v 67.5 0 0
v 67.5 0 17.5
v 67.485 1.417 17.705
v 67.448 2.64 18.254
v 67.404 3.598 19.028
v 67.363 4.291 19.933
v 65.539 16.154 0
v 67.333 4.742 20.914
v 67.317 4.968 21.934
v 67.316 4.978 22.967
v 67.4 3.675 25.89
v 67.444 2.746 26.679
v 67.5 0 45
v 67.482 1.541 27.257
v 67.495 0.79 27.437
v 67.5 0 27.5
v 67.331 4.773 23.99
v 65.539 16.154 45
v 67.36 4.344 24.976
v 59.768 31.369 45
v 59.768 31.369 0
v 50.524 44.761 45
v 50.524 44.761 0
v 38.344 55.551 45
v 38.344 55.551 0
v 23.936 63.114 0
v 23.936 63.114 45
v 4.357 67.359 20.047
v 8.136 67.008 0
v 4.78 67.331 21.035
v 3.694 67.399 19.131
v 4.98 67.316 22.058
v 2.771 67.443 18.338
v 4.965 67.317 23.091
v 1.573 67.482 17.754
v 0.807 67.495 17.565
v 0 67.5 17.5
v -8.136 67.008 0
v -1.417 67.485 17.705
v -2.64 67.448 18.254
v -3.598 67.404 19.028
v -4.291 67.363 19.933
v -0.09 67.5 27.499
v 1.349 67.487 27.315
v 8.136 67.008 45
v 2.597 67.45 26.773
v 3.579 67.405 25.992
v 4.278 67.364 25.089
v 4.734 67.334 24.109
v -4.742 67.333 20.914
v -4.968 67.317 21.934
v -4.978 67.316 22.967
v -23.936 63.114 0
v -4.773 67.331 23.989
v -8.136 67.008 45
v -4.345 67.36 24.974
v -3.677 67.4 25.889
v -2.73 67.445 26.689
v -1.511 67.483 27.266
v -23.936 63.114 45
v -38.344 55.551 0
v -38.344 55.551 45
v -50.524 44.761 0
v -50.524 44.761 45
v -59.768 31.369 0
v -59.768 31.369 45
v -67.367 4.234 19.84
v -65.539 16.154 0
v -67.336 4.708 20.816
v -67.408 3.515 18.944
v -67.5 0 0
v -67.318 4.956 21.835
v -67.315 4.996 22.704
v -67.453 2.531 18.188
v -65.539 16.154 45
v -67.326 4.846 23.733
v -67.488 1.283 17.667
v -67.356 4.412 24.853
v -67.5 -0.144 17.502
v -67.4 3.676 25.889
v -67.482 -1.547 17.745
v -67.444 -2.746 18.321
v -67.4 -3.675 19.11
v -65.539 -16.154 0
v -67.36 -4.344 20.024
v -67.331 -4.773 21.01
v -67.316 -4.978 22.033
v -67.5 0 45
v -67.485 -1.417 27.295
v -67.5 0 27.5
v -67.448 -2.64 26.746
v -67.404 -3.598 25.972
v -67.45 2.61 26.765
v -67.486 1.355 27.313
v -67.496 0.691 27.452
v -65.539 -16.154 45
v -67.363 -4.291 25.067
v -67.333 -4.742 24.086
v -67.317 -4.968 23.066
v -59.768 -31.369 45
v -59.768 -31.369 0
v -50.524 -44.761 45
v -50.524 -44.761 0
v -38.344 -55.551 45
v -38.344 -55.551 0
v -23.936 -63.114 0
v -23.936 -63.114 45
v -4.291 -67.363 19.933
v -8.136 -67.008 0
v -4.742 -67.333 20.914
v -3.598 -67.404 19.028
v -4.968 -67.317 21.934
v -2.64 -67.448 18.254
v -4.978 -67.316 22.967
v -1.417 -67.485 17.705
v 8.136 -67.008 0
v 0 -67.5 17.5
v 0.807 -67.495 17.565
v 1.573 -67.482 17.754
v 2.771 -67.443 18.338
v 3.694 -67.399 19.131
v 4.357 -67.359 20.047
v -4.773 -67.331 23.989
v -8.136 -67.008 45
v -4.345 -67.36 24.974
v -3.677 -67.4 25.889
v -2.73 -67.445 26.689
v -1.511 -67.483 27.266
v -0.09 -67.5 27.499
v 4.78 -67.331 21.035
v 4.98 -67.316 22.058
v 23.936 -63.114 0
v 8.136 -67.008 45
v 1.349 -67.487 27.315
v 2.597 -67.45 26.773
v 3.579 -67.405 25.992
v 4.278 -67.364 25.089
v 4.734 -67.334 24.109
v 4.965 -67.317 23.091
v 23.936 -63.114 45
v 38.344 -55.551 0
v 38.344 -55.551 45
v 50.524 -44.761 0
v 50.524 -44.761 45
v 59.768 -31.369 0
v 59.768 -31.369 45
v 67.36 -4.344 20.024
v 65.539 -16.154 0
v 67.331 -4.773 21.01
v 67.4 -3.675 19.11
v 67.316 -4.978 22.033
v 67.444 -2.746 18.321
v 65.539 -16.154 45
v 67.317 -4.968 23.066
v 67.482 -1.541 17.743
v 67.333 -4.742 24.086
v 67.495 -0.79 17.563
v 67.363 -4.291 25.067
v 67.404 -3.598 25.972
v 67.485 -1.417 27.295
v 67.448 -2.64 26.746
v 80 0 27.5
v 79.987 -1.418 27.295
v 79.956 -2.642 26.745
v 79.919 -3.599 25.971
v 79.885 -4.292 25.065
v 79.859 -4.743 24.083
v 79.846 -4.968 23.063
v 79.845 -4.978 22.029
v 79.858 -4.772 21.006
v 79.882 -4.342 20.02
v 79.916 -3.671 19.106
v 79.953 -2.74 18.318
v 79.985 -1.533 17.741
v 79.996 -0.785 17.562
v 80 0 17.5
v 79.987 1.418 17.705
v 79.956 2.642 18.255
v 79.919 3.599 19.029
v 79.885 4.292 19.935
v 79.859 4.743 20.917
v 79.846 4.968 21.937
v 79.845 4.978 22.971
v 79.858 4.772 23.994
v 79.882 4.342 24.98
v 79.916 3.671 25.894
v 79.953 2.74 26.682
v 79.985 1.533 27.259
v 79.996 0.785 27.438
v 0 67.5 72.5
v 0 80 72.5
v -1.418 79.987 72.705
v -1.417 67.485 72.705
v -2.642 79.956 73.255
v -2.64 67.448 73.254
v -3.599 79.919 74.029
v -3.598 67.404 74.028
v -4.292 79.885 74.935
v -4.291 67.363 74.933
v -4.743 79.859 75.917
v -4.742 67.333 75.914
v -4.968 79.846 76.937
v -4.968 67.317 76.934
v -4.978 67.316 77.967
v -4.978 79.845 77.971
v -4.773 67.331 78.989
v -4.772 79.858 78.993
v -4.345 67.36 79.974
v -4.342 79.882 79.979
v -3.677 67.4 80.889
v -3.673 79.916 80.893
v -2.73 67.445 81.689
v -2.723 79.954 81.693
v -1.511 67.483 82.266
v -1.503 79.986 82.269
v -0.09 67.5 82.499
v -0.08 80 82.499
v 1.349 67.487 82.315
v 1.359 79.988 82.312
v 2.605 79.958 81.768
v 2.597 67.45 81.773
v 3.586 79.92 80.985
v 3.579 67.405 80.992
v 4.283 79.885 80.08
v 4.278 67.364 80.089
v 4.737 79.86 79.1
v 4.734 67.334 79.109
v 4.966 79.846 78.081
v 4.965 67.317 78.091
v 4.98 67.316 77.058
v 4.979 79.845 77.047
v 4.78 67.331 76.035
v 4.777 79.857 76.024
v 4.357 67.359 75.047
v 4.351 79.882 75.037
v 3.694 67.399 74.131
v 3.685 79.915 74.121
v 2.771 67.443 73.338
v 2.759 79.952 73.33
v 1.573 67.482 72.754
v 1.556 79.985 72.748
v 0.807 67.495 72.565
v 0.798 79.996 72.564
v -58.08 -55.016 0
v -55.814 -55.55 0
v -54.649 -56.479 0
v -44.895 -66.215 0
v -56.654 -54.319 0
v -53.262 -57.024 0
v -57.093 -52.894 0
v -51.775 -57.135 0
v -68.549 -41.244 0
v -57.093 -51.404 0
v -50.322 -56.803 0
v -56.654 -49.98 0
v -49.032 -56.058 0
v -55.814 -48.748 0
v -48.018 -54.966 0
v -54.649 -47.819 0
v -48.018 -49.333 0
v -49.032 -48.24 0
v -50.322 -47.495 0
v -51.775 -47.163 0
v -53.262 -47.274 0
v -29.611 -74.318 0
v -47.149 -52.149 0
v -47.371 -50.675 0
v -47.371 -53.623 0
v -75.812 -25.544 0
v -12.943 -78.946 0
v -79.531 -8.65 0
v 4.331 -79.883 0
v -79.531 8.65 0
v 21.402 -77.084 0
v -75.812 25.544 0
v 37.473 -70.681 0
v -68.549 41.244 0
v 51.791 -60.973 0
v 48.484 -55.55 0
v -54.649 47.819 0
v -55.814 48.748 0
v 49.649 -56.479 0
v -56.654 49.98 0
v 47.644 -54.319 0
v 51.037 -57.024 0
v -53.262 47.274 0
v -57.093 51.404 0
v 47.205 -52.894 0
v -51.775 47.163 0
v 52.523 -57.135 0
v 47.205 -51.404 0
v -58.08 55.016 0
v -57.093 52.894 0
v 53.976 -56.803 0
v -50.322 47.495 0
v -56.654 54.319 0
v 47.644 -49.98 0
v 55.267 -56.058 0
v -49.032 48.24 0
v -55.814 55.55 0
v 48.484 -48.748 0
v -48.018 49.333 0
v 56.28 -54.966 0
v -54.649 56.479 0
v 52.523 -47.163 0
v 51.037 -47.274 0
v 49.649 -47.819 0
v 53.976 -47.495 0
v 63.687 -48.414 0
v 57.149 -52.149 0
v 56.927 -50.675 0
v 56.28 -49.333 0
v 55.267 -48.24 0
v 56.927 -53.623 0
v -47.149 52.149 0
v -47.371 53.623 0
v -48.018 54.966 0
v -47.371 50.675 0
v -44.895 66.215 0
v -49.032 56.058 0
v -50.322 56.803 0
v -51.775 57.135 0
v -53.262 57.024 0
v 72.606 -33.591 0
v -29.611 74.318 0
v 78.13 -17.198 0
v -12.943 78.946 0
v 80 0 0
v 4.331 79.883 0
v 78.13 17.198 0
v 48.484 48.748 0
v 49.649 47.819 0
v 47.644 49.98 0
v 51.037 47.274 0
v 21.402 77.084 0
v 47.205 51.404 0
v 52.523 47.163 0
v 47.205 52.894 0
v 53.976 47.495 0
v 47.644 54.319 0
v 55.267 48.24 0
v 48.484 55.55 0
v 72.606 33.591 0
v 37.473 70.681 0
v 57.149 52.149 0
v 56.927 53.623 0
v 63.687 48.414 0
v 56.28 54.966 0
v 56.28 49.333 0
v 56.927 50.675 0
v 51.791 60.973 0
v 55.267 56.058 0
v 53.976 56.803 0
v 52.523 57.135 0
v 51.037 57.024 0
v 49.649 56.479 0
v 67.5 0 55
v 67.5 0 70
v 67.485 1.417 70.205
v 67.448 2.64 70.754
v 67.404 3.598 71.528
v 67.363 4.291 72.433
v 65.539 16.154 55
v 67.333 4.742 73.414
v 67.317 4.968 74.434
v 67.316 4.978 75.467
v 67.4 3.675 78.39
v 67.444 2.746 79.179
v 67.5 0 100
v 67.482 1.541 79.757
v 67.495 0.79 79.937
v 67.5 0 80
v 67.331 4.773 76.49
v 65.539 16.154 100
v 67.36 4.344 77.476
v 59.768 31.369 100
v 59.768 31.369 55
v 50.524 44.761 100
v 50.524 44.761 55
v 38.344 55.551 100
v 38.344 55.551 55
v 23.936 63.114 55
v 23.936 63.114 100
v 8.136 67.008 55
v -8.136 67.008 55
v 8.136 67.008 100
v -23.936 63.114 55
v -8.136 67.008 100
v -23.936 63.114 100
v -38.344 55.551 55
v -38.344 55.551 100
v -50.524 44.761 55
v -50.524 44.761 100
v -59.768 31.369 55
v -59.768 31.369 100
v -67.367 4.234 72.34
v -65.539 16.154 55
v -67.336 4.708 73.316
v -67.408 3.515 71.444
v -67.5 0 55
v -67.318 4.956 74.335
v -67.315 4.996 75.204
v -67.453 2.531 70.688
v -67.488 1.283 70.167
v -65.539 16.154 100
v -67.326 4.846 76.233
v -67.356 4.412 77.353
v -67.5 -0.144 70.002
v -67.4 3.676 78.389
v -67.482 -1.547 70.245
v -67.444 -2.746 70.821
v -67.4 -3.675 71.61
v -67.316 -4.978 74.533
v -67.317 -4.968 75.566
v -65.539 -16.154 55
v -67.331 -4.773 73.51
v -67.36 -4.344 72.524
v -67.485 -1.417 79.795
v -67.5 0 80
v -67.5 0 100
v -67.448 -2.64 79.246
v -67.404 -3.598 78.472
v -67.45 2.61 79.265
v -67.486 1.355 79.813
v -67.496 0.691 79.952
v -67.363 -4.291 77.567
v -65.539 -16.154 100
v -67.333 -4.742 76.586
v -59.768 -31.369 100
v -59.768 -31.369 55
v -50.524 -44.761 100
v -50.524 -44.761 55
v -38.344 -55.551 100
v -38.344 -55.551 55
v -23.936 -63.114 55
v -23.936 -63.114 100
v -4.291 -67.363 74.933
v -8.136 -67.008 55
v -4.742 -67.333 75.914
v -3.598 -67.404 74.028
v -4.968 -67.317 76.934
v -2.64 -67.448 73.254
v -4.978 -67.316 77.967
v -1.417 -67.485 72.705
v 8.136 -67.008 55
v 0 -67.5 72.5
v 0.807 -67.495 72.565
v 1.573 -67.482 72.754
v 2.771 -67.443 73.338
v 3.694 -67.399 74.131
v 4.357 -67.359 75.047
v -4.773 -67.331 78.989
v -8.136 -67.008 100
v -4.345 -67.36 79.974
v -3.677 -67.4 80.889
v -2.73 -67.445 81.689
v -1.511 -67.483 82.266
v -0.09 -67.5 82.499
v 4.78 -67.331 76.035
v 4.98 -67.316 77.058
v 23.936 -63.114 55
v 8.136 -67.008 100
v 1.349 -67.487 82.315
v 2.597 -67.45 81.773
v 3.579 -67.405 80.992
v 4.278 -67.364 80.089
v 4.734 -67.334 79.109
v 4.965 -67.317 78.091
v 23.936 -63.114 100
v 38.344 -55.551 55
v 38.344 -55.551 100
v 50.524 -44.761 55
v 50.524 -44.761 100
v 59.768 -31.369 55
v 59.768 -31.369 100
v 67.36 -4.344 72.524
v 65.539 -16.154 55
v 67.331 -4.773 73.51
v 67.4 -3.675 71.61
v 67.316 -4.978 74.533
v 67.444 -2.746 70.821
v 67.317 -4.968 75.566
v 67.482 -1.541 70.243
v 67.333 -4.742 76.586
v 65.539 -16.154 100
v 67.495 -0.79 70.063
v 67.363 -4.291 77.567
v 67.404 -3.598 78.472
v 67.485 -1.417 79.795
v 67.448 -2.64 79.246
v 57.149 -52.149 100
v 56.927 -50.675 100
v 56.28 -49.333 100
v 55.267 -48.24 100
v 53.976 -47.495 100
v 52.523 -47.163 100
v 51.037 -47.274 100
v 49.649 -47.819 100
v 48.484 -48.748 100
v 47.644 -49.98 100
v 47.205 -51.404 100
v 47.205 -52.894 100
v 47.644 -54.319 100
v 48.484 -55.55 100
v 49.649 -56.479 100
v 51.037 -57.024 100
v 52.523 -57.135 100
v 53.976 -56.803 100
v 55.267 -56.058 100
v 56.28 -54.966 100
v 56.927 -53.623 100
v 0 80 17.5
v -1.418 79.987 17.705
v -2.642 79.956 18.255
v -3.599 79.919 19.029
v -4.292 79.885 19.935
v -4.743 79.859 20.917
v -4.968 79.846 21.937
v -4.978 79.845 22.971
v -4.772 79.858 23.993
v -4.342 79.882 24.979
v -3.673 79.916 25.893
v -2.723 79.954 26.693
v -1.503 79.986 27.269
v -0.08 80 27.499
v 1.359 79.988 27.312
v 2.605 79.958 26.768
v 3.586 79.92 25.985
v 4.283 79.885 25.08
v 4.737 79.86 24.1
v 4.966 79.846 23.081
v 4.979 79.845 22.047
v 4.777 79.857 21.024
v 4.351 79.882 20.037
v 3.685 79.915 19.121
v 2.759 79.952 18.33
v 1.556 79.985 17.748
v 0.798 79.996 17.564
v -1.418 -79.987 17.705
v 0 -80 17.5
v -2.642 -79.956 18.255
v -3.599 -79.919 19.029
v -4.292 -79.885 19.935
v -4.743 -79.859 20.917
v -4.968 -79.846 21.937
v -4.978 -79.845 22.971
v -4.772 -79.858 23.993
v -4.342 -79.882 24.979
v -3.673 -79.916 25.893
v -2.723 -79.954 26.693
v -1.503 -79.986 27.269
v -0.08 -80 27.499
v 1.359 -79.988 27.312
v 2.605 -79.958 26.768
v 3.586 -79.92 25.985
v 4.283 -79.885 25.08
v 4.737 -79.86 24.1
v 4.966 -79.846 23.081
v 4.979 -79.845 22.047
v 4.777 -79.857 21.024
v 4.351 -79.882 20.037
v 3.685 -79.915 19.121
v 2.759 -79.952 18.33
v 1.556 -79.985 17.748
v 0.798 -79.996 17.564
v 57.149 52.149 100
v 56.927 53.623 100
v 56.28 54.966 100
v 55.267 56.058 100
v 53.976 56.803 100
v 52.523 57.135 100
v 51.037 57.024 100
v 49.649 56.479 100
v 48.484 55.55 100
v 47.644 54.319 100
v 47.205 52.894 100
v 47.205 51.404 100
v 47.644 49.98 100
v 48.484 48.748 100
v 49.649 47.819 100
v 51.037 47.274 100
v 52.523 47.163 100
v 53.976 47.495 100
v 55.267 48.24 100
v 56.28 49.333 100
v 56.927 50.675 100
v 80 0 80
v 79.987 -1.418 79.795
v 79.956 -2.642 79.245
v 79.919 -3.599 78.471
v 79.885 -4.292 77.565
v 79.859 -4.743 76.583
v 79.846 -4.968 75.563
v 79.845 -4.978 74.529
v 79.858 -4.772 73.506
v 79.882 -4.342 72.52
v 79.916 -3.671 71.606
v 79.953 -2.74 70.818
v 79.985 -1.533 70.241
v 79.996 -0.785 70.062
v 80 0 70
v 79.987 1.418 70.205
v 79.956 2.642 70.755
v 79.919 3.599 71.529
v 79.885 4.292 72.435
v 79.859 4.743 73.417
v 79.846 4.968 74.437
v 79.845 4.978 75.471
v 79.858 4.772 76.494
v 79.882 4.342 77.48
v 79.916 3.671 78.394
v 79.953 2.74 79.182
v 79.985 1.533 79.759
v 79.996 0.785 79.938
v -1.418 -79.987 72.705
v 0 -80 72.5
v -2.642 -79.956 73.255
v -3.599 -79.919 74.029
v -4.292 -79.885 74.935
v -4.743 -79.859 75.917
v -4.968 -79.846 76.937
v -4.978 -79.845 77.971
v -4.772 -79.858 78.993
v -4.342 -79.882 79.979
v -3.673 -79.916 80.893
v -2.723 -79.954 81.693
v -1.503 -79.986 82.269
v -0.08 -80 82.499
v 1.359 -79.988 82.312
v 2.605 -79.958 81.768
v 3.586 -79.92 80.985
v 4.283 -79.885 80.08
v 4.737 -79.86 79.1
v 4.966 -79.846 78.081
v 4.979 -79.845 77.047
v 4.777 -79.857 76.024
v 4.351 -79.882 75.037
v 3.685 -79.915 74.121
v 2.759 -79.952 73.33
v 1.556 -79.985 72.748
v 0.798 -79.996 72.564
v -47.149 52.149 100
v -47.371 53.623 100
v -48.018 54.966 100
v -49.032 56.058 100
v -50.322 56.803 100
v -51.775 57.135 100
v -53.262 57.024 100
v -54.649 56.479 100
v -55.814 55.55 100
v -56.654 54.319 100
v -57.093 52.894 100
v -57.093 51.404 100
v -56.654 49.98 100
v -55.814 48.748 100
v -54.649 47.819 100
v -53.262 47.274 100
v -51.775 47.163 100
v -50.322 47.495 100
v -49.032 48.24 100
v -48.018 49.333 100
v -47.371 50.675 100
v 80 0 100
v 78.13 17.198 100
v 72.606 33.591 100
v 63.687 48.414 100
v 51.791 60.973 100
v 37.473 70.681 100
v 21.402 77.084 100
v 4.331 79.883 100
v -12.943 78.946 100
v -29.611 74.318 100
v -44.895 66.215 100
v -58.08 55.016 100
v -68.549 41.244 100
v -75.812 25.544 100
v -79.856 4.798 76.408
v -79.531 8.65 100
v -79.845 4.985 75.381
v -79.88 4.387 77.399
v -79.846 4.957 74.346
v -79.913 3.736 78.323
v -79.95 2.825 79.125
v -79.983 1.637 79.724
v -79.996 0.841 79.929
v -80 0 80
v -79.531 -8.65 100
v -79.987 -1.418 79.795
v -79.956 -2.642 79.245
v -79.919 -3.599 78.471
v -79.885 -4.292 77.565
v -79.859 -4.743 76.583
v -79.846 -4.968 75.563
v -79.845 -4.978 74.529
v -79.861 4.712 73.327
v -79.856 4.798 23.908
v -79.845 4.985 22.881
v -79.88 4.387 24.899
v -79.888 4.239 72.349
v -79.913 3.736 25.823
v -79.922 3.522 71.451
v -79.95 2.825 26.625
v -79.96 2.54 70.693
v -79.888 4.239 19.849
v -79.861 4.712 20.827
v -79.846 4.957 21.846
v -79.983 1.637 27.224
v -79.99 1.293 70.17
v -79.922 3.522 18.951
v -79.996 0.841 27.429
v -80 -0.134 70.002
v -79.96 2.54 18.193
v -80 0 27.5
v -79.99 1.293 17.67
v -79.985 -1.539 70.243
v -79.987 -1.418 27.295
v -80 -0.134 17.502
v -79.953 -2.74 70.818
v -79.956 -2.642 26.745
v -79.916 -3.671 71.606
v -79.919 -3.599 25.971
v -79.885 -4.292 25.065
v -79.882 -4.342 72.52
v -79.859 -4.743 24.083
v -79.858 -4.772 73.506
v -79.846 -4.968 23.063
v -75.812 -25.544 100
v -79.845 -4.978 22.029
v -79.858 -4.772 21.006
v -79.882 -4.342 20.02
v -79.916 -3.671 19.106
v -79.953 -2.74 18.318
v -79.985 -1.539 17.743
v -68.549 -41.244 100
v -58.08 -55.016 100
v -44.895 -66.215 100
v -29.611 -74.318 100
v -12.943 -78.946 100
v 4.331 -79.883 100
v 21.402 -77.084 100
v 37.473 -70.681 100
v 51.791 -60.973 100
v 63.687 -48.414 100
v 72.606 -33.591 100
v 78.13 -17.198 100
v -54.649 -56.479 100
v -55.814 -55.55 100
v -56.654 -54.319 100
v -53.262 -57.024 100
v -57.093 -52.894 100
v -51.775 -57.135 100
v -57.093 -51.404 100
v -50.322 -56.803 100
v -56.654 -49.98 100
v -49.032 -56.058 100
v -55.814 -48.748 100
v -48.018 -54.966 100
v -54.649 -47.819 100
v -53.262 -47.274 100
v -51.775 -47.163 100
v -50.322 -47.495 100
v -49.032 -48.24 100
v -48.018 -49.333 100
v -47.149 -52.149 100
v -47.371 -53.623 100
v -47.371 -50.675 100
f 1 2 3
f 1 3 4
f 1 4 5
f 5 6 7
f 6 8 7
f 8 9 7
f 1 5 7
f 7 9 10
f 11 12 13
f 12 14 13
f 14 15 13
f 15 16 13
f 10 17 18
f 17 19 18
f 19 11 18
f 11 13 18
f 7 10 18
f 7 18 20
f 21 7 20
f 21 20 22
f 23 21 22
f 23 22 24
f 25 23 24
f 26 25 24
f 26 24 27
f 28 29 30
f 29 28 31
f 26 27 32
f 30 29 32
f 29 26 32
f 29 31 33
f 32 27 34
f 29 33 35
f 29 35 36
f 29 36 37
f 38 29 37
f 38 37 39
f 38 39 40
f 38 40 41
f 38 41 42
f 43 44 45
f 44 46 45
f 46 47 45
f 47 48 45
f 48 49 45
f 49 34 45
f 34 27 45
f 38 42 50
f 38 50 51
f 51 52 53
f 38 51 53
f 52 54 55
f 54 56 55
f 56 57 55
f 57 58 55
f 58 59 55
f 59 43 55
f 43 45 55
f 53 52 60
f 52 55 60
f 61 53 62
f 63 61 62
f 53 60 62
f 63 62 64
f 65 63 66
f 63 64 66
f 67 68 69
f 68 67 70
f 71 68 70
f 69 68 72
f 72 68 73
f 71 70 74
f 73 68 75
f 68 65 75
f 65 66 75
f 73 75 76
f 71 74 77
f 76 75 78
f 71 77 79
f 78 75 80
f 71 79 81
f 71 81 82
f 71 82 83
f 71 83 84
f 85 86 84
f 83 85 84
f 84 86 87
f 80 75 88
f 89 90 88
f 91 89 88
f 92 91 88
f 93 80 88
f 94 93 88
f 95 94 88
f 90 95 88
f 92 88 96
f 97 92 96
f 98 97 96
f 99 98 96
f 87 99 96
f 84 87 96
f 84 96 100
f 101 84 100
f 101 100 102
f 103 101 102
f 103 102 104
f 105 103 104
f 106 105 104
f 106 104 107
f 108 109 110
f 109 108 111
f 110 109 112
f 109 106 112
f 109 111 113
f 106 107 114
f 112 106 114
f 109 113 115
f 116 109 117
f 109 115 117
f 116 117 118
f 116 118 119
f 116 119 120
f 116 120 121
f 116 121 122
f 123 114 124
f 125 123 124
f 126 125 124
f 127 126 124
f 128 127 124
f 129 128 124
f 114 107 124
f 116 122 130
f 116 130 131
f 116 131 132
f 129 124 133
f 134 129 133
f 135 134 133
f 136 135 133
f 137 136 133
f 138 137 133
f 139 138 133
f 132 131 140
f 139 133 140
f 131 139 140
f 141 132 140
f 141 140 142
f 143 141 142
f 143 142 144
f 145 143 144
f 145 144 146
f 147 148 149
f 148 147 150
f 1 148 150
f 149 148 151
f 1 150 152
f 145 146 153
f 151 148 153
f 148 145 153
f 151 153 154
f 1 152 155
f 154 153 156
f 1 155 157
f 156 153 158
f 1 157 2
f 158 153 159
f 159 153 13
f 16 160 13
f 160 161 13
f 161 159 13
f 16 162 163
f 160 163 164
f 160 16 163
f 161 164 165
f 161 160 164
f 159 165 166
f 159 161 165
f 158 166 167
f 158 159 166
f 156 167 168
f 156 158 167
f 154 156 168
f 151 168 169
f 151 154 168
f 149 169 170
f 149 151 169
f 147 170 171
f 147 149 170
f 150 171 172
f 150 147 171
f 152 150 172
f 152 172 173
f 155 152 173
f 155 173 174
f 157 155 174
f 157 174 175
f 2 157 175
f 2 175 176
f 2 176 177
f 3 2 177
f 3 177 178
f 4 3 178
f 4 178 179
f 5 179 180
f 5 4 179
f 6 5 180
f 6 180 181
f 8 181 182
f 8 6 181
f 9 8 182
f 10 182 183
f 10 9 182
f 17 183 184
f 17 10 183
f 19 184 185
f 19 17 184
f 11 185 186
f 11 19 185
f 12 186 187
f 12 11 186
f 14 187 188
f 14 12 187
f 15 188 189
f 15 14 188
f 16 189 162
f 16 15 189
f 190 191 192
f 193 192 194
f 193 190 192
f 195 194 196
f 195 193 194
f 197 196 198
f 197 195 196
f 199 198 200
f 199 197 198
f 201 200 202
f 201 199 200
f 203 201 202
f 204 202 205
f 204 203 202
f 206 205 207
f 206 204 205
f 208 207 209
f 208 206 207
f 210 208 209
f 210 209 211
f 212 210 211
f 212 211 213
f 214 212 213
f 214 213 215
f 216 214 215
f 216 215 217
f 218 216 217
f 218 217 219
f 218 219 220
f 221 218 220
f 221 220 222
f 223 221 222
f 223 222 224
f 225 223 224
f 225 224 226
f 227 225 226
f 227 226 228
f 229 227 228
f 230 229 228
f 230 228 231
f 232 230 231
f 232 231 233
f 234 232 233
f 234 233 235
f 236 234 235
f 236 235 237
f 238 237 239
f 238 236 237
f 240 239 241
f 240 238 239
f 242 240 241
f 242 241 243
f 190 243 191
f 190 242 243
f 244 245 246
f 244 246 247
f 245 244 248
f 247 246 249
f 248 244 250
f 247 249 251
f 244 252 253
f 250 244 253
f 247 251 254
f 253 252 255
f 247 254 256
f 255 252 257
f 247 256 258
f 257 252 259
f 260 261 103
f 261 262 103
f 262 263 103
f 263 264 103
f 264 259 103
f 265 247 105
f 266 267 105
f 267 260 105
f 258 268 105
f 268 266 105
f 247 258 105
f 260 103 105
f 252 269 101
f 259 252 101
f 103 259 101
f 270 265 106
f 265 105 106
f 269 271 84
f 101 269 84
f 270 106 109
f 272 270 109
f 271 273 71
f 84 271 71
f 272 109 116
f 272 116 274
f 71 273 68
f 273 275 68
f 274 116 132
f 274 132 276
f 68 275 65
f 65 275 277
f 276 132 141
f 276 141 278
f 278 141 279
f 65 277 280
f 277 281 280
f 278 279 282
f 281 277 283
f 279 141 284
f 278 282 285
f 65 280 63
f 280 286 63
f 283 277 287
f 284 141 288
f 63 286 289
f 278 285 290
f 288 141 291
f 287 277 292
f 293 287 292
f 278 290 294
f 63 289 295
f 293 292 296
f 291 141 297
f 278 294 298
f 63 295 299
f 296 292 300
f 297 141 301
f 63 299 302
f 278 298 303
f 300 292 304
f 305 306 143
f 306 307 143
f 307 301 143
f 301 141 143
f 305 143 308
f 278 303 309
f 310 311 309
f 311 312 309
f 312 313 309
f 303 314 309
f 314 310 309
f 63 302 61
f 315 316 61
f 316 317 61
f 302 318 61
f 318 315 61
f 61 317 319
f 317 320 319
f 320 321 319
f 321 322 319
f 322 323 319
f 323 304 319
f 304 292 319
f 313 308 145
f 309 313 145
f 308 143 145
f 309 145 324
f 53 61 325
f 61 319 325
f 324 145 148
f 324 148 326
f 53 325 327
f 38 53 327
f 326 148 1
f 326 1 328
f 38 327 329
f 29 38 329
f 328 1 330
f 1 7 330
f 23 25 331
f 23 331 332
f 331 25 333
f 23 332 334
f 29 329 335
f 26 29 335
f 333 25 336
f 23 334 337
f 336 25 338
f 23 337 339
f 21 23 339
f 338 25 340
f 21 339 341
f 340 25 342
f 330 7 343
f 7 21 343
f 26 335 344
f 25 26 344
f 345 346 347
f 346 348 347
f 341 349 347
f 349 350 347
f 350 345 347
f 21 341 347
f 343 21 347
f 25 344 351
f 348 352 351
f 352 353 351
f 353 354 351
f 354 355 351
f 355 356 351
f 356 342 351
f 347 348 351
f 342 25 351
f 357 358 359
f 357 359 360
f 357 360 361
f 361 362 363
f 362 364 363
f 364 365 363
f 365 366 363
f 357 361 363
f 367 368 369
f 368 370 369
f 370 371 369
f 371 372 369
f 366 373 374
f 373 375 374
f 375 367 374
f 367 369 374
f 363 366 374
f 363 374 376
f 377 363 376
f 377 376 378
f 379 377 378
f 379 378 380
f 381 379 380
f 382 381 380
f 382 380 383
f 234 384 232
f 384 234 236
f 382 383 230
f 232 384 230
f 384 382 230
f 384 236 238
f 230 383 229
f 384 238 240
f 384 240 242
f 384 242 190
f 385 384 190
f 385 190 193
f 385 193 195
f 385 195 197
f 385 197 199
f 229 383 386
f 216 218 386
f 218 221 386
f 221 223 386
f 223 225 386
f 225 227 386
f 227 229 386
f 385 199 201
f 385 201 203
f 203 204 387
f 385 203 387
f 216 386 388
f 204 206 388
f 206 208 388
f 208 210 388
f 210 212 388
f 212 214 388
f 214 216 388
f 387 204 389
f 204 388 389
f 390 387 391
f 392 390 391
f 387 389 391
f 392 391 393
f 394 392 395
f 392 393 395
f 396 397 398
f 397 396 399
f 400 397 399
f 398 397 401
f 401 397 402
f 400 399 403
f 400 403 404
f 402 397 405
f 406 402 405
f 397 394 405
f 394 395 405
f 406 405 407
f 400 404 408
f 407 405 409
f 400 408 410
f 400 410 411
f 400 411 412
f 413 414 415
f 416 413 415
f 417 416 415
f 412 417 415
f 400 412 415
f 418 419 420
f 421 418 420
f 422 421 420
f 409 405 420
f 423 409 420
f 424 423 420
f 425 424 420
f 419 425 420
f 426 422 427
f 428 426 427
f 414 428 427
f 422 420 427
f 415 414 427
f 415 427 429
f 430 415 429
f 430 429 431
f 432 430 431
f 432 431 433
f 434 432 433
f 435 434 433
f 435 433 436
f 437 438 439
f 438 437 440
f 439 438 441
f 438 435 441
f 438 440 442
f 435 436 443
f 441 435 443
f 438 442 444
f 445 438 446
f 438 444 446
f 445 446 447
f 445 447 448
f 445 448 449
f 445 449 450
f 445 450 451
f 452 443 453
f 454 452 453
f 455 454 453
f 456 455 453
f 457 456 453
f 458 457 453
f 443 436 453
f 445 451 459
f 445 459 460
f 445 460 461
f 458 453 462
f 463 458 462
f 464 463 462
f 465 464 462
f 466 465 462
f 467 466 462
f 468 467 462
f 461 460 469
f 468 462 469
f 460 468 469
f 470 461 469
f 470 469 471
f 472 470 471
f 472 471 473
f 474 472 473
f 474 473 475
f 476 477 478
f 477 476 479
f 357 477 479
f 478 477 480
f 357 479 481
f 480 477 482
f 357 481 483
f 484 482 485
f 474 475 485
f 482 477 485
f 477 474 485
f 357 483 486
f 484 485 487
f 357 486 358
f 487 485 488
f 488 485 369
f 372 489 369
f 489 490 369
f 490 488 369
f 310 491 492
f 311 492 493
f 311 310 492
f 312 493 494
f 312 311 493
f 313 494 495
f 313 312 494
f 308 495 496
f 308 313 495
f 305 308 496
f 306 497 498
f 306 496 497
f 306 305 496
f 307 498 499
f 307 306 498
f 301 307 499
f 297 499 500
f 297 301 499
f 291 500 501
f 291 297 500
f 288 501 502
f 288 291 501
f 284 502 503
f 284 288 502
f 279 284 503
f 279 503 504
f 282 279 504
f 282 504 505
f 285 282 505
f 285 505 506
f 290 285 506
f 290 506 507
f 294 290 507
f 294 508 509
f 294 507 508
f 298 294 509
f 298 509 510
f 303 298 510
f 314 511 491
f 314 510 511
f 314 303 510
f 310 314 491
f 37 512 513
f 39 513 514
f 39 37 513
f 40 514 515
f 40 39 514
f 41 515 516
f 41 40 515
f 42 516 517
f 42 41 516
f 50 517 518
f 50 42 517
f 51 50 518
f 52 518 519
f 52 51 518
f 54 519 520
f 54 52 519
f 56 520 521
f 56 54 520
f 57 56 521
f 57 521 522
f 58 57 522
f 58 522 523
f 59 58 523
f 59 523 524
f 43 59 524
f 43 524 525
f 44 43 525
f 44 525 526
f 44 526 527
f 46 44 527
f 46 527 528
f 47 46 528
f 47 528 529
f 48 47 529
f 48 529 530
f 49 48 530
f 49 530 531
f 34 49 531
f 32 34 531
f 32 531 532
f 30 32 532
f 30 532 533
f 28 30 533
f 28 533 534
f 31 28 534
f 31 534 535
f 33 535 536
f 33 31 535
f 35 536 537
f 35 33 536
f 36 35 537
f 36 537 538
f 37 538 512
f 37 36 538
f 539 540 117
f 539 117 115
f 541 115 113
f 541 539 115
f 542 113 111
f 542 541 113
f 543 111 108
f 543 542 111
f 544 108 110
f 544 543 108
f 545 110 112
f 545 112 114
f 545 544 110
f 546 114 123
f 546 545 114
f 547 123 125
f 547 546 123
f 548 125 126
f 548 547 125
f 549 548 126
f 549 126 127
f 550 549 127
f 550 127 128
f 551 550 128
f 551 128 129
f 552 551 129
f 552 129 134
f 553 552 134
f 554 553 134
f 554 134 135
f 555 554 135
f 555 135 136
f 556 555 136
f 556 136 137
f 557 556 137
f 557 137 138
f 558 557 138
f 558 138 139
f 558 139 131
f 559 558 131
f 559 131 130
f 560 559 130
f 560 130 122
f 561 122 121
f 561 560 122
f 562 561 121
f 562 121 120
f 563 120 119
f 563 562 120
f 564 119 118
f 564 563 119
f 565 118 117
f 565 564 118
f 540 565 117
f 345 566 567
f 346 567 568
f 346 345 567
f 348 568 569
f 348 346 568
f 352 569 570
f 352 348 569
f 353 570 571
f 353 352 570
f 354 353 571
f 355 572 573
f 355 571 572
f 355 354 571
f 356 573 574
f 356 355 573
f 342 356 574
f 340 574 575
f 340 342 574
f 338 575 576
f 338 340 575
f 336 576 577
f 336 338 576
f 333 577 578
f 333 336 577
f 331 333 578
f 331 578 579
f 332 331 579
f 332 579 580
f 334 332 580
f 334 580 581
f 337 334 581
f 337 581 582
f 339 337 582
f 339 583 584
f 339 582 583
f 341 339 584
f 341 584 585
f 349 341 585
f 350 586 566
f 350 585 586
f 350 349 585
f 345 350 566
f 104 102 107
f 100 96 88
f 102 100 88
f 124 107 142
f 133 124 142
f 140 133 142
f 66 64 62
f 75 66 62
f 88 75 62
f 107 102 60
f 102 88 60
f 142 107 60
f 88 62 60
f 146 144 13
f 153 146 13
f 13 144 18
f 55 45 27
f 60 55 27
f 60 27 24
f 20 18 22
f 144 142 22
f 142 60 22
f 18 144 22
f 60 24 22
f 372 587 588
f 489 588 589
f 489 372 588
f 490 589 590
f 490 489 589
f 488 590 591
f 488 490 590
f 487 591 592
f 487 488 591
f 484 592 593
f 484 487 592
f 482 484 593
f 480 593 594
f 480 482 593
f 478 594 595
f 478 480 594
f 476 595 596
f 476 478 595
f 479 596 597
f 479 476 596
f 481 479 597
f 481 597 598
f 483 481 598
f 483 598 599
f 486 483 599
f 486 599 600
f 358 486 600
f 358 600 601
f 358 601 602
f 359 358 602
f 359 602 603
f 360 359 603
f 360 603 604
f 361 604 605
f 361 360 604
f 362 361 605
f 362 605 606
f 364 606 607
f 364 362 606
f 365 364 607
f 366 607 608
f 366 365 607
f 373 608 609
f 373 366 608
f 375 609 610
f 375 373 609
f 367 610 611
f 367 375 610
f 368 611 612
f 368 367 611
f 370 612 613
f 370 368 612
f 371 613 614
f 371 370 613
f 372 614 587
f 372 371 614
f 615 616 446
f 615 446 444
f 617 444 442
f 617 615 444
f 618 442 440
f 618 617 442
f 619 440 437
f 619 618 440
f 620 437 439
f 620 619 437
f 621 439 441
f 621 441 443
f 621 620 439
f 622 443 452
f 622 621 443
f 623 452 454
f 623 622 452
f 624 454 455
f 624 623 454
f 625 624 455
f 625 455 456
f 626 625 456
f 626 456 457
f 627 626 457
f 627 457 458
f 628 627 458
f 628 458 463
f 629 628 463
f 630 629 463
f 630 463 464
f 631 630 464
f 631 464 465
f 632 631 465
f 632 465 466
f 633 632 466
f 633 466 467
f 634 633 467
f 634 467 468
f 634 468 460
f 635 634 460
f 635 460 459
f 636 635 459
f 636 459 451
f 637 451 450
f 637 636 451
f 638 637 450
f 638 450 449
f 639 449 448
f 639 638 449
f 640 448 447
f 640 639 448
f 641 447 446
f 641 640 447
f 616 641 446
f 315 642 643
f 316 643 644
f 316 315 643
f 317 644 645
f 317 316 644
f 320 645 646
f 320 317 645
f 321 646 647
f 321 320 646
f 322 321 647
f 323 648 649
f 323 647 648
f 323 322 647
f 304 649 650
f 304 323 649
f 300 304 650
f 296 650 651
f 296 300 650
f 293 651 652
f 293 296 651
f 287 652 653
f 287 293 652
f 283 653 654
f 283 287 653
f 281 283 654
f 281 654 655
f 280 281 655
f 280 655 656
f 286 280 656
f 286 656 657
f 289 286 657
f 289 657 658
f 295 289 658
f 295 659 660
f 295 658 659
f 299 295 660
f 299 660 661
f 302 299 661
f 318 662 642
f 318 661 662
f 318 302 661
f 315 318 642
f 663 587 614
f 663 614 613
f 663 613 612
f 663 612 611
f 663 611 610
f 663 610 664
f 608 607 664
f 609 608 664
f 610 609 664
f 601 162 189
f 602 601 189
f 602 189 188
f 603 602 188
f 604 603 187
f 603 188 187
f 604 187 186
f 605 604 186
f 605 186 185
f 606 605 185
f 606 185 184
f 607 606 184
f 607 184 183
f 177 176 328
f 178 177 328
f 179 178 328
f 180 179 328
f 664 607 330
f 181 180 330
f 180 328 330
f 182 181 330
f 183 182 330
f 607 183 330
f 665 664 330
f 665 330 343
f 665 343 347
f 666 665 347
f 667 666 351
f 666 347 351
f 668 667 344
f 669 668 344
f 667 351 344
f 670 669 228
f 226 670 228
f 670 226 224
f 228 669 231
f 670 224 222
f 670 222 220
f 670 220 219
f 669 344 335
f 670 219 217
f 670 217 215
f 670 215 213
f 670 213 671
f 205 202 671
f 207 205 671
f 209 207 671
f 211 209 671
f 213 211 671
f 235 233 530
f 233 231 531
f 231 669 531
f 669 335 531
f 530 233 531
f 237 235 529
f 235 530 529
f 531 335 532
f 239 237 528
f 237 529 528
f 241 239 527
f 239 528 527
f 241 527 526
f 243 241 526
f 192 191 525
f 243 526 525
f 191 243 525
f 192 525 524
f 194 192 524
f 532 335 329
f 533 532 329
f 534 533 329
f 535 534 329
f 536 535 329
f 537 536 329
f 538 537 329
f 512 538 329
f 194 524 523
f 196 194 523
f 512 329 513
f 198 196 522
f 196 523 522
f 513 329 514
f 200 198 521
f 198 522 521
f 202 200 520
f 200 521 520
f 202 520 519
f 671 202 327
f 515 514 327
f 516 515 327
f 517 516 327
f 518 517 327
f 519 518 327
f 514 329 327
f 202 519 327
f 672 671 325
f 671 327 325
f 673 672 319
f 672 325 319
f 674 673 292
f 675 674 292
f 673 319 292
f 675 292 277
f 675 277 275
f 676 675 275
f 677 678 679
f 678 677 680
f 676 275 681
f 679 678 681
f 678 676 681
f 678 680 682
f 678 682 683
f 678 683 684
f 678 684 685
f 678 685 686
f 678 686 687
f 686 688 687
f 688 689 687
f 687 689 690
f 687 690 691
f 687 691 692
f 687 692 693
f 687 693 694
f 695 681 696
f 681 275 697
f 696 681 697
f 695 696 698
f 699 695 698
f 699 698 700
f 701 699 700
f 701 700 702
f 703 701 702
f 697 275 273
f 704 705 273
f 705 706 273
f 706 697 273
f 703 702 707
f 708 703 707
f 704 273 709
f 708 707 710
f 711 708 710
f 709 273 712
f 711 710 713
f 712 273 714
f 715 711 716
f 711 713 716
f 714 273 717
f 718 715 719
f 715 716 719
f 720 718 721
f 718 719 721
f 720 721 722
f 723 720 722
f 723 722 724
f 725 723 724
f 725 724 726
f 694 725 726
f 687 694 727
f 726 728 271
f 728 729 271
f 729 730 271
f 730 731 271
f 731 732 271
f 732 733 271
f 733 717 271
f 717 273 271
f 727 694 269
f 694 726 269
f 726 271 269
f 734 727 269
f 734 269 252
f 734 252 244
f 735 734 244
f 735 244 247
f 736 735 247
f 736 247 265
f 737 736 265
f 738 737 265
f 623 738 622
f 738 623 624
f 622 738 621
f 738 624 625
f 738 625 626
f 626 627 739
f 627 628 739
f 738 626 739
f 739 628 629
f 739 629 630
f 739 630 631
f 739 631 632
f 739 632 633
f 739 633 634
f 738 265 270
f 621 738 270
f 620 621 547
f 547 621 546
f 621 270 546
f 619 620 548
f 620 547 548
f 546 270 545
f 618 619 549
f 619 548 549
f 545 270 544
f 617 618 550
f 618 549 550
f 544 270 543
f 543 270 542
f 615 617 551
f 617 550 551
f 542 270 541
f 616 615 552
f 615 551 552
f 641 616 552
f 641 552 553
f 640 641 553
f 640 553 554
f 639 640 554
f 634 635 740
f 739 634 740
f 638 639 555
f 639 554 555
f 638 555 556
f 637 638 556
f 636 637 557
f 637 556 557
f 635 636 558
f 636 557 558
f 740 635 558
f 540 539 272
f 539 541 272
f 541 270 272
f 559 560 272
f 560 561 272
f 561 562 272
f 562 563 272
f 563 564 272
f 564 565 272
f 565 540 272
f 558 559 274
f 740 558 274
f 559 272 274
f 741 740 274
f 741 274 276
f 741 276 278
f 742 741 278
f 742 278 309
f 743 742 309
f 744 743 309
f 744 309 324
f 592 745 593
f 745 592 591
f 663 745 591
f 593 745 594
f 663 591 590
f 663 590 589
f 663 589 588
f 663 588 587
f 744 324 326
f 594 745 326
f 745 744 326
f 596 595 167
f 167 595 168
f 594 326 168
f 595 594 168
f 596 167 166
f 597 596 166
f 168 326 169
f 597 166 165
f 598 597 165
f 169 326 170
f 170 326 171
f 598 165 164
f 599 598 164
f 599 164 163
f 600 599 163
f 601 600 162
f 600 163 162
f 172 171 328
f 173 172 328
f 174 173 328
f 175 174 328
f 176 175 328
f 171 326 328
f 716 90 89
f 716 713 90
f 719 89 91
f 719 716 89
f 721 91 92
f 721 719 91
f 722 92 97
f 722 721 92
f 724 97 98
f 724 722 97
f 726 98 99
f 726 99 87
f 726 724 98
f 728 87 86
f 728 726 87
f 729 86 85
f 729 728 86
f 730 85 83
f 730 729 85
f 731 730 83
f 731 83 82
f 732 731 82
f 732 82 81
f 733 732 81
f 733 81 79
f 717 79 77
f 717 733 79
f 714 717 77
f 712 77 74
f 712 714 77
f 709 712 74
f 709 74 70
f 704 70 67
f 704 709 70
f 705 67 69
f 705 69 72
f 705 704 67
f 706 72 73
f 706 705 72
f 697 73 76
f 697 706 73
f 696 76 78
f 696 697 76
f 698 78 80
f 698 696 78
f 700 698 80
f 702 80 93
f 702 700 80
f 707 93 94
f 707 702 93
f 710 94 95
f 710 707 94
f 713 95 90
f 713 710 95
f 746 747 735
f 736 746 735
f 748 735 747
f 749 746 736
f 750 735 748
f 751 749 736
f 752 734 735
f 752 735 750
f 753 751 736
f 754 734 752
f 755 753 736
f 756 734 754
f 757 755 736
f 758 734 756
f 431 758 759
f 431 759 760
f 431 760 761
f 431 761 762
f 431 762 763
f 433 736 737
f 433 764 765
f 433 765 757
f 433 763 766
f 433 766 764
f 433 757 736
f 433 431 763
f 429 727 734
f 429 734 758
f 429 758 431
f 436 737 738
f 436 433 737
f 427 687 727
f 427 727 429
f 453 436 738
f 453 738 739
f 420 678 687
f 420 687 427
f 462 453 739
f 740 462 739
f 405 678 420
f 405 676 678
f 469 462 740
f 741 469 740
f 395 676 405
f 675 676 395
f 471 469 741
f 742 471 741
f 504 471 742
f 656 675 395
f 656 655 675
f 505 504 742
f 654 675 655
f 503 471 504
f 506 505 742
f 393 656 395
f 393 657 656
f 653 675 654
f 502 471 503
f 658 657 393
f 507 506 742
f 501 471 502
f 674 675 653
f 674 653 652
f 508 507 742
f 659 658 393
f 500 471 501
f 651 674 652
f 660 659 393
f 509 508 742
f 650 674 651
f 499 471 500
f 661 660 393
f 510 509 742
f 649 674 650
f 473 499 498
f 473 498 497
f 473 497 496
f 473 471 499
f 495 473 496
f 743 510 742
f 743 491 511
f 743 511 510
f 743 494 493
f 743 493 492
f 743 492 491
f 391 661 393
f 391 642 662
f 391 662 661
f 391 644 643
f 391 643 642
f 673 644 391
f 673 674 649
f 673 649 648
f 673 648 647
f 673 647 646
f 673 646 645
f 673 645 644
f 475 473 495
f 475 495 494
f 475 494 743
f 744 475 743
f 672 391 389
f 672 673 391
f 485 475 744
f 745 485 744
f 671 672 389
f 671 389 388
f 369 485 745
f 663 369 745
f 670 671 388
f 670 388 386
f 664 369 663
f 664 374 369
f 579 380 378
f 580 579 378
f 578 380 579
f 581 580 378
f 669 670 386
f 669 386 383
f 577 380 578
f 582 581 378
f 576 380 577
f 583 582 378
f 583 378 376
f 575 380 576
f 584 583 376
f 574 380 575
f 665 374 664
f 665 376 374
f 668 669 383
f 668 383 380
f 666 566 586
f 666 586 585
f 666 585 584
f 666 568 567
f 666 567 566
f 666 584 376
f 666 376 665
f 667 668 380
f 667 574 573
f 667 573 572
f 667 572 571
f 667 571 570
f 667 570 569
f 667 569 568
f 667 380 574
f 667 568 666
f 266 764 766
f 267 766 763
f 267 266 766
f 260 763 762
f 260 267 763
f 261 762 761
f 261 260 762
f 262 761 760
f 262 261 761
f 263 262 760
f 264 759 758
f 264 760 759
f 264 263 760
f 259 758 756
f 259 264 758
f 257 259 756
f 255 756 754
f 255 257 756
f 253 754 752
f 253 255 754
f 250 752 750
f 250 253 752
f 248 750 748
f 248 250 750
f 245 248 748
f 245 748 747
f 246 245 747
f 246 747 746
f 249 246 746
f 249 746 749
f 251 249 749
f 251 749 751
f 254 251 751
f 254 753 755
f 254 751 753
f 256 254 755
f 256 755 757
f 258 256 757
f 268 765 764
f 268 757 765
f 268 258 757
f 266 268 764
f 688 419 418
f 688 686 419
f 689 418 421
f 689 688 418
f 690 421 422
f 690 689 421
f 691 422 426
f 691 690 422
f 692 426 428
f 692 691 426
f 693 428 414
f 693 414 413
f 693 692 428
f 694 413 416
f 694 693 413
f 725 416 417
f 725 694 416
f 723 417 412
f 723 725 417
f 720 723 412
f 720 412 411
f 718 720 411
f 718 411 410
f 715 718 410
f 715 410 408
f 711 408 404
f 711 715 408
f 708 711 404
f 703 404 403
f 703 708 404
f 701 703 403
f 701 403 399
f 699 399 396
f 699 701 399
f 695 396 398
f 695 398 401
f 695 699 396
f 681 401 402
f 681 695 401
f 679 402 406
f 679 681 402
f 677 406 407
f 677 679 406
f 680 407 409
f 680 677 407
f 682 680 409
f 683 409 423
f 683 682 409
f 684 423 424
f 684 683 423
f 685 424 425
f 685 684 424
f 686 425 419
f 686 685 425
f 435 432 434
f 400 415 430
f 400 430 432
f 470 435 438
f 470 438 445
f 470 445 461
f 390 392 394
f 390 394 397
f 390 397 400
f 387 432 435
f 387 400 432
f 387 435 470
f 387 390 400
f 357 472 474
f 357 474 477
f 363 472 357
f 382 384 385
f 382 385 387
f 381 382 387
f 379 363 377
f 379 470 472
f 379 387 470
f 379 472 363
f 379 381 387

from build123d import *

# Parameters (mm, degrees)
SKETCH1_R               = 80
BOSS_EXTRUDE1_DEPTH     = 100
SKETCH3_R               = 67.5
CUT_EXTRUDE1_DEPTH      = 45
CUT_EXTRUDE5_START      = 45
SKETCH2_R               = 67.5
CUT_EXTRUDE5_DEPTH      = 45
CUT_EXTRUDE6_DEPTH      = 106
CUT_EXTRUDE6_DEPTH_BACK = 92
SKETCH5_R               = 5
CUT_EXTRUDE7_DEPTH      = 98
CUT_EXTRUDE7_DEPTH_BACK = 120
SKETCH5_3_R             = 5
CUT_EXTRUDE8_DEPTH      = 118
CUT_EXTRUDE8_DEPTH_BACK = 146
SKETCH6_R               = 5
SKETCH7_R               = 5
CUT_EXTRUDE15_DEPTH     = 118


with BuildPart() as part:
    # Sketch1 → Boss-Extrude1 (new body)
    with BuildSketch(Plane.XY):
        Circle(SKETCH1_R)
    extrude(amount=BOSS_EXTRUDE1_DEPTH)

    # Sketch3 → Cut-Extrude1 (cut)
    with BuildSketch(Plane.XY.offset(100)):
        Circle(SKETCH3_R)
    extrude(amount=-CUT_EXTRUDE1_DEPTH, mode=Mode.SUBTRACT)

    # Sketch2 → Cut-Extrude5 (cut)
    with BuildSketch(Plane.XY.offset(CUT_EXTRUDE5_START)):
        Circle(SKETCH2_R)
    extrude(amount=-CUT_EXTRUDE5_DEPTH, mode=Mode.SUBTRACT)

    # Sketch5 → Cut-Extrude6 (cut, two sides: drawn at the far end of the back side and taken through both)
    with BuildSketch(Plane(origin=(0, 0, 0), x_dir=(0, 0, -1), z_dir=(1, 0, 0)).offset(-CUT_EXTRUDE6_DEPTH_BACK)):
        with Locations((-75, 0)):
            Circle(SKETCH5_R)
    extrude(amount=CUT_EXTRUDE6_DEPTH + CUT_EXTRUDE6_DEPTH_BACK, mode=Mode.SUBTRACT)

    # Sketch5<3> → Cut-Extrude7 (cut, two sides: drawn at the far end of the back side and taken through both)
    with BuildSketch(Plane(origin=(0, 0, 0), x_dir=(0, 0, -1), z_dir=(1, 0, 0)).offset(-CUT_EXTRUDE7_DEPTH_BACK)):
        with Locations((-75, 0)):
            Circle(SKETCH5_3_R)
        with Locations((-22.5, 0)):
            Circle(SKETCH5_3_R)
    extrude(amount=CUT_EXTRUDE7_DEPTH + CUT_EXTRUDE7_DEPTH_BACK, mode=Mode.SUBTRACT)

    # Sketch6 → Cut-Extrude8 (cut, two sides: drawn at the far end of the back side and taken through both)
    with BuildSketch(Plane(origin=(0, 0, 0), x_dir=(1, 0, 0), z_dir=(0, 1, 0)).offset(-CUT_EXTRUDE8_DEPTH_BACK)):
        with Locations((0, -22.5)):
            Circle(SKETCH6_R)
        with Locations((0, -77.5)):
            Circle(SKETCH6_R)
    extrude(amount=CUT_EXTRUDE8_DEPTH + CUT_EXTRUDE8_DEPTH_BACK, mode=Mode.SUBTRACT)

    # Sketch7 → Cut-Extrude15 (cut)
    with BuildSketch(Plane.XY):
        with Locations((-52.149125113, 52.149125113)):
            Circle(SKETCH7_R)
        with Locations((52.149125113, 52.149125113)):
            Circle(SKETCH7_R)
        with Locations((52.149125113, -52.149125113)):
            Circle(SKETCH7_R)
        with Locations((-52.149125113, -52.149125113)):
            Circle(SKETCH7_R)
    extrude(amount=CUT_EXTRUDE15_DEPTH, mode=Mode.SUBTRACT)


solid = part.part
